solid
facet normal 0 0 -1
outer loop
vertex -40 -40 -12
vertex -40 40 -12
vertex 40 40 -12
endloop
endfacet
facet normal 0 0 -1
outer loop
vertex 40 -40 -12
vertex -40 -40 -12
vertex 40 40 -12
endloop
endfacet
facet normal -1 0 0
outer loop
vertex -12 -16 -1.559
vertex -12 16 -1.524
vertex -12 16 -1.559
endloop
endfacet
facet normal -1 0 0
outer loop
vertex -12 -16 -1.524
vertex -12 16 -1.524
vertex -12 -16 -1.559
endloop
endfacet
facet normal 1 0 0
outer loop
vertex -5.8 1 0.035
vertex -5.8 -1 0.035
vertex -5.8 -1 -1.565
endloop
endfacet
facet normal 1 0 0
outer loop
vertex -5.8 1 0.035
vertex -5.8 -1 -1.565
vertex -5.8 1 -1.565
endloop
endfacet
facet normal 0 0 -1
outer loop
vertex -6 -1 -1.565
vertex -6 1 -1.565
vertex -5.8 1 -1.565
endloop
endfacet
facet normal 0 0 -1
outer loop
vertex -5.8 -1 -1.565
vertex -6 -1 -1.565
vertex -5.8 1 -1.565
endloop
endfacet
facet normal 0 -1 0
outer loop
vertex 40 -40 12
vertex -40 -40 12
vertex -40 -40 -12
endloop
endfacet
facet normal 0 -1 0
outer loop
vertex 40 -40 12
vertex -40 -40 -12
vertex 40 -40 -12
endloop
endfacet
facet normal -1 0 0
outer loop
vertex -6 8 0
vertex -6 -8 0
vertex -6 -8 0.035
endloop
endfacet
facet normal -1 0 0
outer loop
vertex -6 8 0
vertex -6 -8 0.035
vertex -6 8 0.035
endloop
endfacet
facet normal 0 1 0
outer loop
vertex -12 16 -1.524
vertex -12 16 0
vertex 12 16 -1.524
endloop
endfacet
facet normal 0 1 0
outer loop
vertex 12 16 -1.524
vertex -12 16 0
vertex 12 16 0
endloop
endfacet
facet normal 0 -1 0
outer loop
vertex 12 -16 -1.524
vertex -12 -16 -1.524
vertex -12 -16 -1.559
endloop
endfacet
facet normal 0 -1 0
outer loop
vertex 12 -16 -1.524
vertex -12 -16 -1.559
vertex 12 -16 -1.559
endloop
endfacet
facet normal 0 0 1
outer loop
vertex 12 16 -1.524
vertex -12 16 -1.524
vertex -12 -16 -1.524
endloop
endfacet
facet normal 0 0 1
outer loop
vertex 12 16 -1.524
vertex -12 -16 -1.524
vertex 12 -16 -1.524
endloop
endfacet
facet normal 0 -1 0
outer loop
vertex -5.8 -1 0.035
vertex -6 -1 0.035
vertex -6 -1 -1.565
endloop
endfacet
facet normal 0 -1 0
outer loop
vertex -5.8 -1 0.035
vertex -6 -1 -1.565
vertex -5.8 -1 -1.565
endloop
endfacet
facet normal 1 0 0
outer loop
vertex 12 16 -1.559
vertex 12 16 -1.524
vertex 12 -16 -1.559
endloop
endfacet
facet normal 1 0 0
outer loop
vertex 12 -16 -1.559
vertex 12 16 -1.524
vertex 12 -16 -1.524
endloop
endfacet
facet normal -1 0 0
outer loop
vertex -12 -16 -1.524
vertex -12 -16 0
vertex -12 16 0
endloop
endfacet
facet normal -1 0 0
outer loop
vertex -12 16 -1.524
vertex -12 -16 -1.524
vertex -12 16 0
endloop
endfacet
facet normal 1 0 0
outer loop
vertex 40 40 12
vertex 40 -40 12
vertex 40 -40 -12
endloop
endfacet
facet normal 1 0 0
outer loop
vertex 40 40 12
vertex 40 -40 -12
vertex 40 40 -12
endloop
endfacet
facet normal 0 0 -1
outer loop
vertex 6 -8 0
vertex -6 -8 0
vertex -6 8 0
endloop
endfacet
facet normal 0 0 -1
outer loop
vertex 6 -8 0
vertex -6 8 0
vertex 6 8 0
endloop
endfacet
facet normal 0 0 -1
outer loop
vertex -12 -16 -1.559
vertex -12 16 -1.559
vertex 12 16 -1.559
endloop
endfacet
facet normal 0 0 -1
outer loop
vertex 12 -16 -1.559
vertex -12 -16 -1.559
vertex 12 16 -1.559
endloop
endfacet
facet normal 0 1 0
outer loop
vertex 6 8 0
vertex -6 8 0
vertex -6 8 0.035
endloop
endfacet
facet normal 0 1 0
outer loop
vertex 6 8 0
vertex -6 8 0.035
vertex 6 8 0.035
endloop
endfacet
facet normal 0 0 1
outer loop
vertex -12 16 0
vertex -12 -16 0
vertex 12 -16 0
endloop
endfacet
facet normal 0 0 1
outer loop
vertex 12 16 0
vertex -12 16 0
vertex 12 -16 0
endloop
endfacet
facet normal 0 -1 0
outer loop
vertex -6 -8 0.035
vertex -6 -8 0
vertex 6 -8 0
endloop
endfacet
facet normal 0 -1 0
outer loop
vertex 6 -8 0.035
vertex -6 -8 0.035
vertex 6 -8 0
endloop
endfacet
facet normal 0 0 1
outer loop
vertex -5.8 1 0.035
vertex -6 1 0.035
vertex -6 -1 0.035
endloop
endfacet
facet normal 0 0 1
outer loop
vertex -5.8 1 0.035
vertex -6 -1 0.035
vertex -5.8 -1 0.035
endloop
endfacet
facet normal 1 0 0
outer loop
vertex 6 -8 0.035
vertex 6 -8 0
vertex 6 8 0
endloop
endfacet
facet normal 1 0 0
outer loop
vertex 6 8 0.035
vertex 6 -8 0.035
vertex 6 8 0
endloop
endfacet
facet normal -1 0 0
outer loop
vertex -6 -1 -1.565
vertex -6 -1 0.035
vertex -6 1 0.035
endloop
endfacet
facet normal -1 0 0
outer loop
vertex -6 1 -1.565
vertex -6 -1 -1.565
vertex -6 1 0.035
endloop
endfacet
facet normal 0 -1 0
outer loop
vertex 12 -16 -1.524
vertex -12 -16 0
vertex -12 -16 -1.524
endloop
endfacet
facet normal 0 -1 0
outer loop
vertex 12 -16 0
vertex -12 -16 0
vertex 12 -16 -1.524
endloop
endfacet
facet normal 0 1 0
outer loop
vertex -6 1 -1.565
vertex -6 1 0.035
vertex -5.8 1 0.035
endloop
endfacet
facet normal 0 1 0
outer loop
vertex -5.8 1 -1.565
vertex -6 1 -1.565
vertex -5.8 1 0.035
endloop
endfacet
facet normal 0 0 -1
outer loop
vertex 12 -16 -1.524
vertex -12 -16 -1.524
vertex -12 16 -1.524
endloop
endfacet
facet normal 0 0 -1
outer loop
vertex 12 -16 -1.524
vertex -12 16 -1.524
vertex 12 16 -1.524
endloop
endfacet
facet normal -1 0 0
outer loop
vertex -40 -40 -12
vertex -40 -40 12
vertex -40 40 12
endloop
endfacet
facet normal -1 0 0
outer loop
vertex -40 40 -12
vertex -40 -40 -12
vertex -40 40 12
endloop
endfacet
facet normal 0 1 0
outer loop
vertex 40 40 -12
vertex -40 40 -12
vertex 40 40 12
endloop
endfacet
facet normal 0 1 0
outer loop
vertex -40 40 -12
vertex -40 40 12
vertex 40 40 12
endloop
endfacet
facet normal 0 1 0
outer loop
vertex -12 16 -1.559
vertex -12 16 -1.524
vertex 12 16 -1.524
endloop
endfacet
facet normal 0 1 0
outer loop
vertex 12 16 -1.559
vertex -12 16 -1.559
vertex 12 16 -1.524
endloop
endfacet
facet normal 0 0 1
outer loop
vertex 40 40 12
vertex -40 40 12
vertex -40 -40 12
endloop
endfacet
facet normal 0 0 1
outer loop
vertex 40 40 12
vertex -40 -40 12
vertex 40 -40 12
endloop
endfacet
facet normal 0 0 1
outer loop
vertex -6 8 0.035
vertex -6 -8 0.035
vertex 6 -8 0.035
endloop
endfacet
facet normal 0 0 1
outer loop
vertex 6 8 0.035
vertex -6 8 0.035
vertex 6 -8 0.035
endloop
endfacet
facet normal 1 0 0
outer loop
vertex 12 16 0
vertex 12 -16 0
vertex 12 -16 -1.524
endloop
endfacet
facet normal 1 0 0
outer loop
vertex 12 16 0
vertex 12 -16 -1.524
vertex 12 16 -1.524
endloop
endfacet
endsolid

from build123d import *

# Parameters (mm, degrees)
SKETCH_W         = 12
SKETCH_H         = 16
EXTRUDE_DEPTH    = 0.035
SKETCH001_W      = 24
SKETCH001_H      = 32
EXTRUDE001_DEPTH = 1.524
SKETCH003_W      = 24
SKETCH003_H      = 32
EXTRUDE002_DEPTH = 0.035
SKETCH002_W      = 0.2
SKETCH002_H      = 2
EXTRUDE003_DEPTH = 1.6
SKETCH004_W      = 80
SKETCH004_H      = 80
EXTRUDE004_DEPTH = 12


with BuildPart() as antenna:
    # Sketch → Extrude (new body)
    with BuildSketch(Plane.XY):
        Rectangle(SKETCH_W, SKETCH_H)
    extrude(amount=EXTRUDE_DEPTH)


with BuildPart() as substrate:
    # Sketch001 (on Sketch) → Extrude001 (new body)
    with BuildSketch(Plane.XY):
        Rectangle(SKETCH001_W, SKETCH001_H)
    extrude(amount=-EXTRUDE001_DEPTH)


with BuildPart() as gnd:
    # Sketch003 (on Face6 of Extrude001) → Extrude002 (new body)
    with BuildSketch(Plane(origin=(0, 0, -1.524), x_dir=(1, 0, 0), z_dir=(0, 0, -1))):
        Rectangle(SKETCH003_W, SKETCH003_H)
    extrude(amount=EXTRUDE002_DEPTH)


with BuildPart() as excitation:
    # Sketch002 (on Sketch) → Extrude003 (new body)
    with BuildSketch(Plane.XY):
        with Locations((-5.9, 0)):
            Rectangle(SKETCH002_W, SKETCH002_H)
    extrude(amount=-EXTRUDE003_DEPTH)


with BuildPart() as excitation_1:
    # Extrude003 placement: moved
    add(excitation.part.moved(Location((0, 0, 0.035))))


with BuildPart() as air:
    # Sketch004 → Extrude004 (new body, symmetric)
    with BuildSketch(Plane.XY):
        Rectangle(SKETCH004_W, SKETCH004_H)
    extrude(amount=EXTRUDE004_DEPTH, both=True)


solid = Compound([antenna.part, substrate.part, gnd.part, excitation_1.part, air.part])
